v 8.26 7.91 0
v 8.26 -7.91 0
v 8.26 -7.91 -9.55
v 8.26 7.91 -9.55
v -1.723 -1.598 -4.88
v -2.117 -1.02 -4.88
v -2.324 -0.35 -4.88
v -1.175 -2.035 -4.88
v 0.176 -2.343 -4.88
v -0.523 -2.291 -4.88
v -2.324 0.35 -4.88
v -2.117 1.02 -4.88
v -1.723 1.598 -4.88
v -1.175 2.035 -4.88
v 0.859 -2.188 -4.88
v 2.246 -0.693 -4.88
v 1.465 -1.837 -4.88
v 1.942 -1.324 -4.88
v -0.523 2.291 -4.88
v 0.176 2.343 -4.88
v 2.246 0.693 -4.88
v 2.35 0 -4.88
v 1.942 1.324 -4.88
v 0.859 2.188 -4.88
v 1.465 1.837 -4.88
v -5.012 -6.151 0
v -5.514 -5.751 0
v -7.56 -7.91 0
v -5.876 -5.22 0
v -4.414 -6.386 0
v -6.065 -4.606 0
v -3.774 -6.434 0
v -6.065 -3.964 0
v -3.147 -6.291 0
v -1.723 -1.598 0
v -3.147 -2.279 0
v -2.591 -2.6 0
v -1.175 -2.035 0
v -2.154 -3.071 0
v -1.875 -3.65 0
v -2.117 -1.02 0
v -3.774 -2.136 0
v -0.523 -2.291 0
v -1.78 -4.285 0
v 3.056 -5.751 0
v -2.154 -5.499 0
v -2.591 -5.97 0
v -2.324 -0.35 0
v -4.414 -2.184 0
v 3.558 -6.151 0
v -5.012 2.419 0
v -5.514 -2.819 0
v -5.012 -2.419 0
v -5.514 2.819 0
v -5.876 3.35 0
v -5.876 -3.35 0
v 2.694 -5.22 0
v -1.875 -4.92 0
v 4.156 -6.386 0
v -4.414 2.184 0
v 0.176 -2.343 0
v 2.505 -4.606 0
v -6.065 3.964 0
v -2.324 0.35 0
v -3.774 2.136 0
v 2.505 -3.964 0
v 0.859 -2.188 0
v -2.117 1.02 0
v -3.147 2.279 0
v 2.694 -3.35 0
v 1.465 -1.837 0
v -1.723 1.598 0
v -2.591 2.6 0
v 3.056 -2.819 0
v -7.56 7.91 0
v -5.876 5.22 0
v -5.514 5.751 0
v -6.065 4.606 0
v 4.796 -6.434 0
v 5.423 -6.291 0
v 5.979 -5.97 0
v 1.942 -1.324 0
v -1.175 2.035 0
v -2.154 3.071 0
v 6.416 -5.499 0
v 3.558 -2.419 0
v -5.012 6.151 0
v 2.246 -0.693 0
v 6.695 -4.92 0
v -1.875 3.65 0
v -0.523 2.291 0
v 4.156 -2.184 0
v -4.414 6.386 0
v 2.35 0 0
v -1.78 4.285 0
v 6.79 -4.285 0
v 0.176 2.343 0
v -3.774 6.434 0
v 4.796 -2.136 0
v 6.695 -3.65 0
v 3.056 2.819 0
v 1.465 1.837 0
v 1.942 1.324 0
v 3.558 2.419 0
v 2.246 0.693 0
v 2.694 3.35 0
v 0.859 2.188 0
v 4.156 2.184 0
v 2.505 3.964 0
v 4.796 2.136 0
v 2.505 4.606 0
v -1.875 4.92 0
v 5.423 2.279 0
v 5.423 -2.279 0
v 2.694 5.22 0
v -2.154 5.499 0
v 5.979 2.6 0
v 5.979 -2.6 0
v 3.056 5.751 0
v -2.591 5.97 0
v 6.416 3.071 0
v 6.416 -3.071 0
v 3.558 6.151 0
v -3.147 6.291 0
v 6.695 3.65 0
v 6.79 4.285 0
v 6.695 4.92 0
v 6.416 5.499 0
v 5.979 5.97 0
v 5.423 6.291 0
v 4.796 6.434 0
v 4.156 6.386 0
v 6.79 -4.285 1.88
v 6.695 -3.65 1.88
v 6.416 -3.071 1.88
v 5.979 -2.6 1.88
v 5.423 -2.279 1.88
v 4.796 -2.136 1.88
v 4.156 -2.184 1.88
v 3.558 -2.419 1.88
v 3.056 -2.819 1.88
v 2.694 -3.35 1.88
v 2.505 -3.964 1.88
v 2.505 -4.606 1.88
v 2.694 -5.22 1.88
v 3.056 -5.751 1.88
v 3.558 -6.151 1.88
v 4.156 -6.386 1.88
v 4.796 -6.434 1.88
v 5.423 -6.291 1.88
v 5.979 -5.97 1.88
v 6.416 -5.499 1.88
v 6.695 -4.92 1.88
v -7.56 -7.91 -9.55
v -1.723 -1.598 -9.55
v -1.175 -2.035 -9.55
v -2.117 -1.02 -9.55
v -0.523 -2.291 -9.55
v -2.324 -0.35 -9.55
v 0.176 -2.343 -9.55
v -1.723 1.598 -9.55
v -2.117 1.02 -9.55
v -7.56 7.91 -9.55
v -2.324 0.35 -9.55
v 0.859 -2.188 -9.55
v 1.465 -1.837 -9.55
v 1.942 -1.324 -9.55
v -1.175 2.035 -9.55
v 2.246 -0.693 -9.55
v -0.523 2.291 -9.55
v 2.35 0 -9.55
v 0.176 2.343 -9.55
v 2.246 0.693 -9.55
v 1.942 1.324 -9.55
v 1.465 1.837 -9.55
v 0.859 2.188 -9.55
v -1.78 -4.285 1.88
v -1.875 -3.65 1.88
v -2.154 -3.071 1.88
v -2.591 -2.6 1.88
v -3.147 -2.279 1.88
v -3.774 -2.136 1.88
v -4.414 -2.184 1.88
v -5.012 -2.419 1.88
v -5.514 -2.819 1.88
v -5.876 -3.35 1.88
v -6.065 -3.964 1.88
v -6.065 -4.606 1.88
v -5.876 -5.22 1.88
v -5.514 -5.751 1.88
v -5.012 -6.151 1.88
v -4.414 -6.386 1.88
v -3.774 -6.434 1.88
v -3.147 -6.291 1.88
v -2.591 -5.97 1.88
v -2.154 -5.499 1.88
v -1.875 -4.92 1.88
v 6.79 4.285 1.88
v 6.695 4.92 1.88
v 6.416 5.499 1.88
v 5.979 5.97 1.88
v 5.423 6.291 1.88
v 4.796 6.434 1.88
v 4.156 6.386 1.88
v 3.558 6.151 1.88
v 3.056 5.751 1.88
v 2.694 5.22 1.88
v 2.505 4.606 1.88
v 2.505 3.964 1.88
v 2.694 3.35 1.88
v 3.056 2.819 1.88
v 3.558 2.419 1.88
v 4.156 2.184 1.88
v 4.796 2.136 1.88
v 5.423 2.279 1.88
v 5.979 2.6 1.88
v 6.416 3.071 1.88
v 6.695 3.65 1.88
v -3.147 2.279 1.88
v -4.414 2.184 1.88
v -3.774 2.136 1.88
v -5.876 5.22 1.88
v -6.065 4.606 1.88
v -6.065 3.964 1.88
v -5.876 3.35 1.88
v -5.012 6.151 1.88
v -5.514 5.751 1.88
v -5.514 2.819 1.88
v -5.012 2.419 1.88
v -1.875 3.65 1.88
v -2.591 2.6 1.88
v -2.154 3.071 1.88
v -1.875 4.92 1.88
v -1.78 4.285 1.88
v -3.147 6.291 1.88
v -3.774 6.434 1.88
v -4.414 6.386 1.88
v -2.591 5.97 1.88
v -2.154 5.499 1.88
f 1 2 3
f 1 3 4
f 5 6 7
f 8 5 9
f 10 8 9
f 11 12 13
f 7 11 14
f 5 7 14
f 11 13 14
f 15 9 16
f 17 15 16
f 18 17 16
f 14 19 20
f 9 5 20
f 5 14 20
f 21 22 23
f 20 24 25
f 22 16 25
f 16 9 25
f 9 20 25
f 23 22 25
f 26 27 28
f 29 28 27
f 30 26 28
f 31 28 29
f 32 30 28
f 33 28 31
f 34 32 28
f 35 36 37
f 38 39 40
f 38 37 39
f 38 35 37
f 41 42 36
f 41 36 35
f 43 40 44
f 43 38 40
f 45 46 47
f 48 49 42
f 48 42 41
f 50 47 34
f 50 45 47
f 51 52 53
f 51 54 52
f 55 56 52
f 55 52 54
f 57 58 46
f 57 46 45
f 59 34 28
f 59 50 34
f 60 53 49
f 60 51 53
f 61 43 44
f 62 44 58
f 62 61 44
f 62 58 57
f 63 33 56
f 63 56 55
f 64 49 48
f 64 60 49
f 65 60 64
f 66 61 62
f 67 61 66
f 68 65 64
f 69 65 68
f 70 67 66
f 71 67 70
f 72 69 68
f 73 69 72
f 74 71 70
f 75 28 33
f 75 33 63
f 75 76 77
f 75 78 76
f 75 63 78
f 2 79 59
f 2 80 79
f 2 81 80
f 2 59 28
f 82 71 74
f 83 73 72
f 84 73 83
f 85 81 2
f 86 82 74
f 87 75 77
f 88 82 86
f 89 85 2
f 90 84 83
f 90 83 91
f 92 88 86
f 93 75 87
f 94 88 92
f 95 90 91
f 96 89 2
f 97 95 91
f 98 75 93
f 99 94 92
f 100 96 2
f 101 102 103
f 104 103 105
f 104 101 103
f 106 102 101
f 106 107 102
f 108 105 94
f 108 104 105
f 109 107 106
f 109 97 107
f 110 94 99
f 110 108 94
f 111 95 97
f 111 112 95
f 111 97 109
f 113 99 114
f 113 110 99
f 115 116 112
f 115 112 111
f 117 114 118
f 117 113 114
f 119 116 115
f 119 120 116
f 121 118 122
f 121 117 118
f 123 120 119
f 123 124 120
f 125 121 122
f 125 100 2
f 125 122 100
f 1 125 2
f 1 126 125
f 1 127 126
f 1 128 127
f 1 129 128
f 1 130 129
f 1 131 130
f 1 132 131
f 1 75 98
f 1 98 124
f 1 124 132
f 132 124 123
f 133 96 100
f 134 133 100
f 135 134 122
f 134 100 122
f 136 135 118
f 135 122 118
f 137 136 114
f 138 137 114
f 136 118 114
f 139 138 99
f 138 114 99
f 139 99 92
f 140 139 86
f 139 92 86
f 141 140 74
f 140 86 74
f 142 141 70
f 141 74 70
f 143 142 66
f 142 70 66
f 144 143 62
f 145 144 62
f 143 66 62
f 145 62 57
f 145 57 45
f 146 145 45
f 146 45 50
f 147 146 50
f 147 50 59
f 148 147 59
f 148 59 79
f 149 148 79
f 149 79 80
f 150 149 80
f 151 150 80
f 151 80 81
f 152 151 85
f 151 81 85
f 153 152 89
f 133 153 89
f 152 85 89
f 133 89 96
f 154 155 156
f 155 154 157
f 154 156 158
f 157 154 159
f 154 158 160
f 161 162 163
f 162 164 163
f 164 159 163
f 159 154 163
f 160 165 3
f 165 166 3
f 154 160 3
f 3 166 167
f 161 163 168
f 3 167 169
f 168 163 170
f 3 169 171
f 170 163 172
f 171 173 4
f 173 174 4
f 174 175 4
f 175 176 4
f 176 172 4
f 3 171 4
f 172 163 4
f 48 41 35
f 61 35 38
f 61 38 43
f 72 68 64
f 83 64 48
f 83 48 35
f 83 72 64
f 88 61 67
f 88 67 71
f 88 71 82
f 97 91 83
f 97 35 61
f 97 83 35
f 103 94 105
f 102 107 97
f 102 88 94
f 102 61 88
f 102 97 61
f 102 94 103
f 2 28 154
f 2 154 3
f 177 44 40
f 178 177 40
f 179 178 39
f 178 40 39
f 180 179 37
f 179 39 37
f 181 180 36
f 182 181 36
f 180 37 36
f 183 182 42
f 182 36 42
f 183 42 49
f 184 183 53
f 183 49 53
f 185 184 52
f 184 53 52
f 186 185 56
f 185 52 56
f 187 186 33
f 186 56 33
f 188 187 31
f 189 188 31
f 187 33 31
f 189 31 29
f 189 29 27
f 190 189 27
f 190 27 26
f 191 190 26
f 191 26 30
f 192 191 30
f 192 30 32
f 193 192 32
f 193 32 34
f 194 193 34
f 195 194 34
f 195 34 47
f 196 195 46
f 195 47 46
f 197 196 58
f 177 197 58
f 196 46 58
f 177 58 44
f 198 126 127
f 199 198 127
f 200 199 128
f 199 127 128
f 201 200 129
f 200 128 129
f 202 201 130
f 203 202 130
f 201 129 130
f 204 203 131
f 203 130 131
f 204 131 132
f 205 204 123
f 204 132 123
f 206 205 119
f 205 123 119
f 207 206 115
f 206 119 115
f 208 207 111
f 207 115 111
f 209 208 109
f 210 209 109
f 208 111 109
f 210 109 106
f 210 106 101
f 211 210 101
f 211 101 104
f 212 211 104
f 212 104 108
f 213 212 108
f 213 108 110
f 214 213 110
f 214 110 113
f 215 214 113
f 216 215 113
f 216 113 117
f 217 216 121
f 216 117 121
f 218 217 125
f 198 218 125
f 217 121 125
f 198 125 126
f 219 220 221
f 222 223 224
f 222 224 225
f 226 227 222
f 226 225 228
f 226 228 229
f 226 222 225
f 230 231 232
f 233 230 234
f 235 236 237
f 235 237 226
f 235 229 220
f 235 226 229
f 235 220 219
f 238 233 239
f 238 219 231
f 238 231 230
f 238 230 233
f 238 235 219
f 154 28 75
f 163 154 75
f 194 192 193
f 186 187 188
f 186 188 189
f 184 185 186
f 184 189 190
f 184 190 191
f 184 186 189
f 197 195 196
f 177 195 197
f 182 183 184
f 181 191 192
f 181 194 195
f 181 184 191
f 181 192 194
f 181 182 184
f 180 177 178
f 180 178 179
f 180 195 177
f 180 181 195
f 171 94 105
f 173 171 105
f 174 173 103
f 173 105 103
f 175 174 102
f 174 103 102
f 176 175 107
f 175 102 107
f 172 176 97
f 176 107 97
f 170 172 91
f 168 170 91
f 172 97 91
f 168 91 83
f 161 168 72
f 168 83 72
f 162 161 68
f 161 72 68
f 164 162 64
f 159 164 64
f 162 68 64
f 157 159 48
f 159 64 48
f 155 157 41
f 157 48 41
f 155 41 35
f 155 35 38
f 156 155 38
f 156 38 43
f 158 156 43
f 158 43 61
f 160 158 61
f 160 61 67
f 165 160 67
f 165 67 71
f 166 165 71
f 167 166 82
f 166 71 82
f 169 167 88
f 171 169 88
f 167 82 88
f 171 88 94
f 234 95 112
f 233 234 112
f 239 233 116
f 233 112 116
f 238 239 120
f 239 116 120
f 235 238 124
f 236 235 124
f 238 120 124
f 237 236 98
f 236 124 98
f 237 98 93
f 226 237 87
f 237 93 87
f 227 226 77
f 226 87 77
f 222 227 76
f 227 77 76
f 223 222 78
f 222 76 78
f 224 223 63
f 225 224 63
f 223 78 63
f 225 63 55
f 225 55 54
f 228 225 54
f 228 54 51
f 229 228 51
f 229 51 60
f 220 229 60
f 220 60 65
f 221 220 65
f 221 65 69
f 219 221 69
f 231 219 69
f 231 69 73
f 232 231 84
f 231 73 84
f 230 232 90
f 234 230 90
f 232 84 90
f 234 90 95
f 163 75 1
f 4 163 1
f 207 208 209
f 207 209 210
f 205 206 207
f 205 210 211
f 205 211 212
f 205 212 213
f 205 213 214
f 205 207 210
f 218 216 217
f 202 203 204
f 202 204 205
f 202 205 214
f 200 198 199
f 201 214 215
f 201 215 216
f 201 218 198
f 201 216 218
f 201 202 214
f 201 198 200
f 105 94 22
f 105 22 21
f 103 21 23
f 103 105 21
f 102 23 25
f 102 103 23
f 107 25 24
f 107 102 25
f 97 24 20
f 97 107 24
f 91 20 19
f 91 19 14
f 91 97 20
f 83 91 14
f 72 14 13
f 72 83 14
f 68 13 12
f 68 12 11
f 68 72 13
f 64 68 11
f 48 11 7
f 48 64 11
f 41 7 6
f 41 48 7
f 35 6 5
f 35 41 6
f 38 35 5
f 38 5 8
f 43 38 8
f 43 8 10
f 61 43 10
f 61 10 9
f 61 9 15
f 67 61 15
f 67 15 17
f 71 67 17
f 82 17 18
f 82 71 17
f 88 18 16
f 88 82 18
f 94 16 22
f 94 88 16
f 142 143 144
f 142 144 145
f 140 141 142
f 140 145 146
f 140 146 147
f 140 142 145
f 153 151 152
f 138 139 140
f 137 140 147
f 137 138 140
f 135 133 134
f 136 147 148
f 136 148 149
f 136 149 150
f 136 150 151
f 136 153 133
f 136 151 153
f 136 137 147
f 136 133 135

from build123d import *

# Parameters (mm, degrees)
F0_W     = 15.82
F0_H     = 15.82
F0_R     = 2.155
F0_R_2   = 2.35
F1_DEPTH = 9.55
F2_DEPTH = 1.88
F3_DEPTH = 4.88


with BuildPart() as f1:
    # F0 (on Top) → F1 (new body)
    with BuildSketch(Plane.XY):
        with Locations((0.3504429367, 0)):
            Rectangle(F0_W, F0_H)
        with Locations((-3.9345570633, -4.285)):
            Circle(F0_R, mode=Mode.SUBTRACT)
        Circle(F0_R_2, mode=Mode.SUBTRACT)
        with Locations((4.6354429367, -4.285)):
            Circle(F0_R, mode=Mode.SUBTRACT)
        with Locations((-3.9345570633, 4.285)):
            Circle(F0_R, mode=Mode.SUBTRACT)
        with Locations((4.6354429367, 4.285)):
            Circle(F0_R, mode=Mode.SUBTRACT)
        with Locations((-3.9345570633, -4.285)):
            Circle(F0_R)
        with Locations((-3.9345570633, 4.285)):
            Circle(F0_R)
        with Locations((4.6354429367, 4.285)):
            Circle(F0_R)
        with Locations((4.6354429367, -4.285)):
            Circle(F0_R)
    extrude(amount=-F1_DEPTH)

    # F0 (on Top) → F2 (join)
    with BuildSketch(Plane.XY):
        with Locations((-3.9345570633, 4.285)):
            Circle(F0_R)
        with Locations((-3.9345570633, -4.285)):
            Circle(F0_R)
        with Locations((4.6354429367, 4.285)):
            Circle(F0_R)
        with Locations((4.6354429367, -4.285)):
            Circle(F0_R)
    extrude(amount=F2_DEPTH)


with BuildPart() as f3:
    # F0 (on Top) → F3 (new body)
    with BuildSketch(Plane.XY):
        Circle(F0_R_2)
    extrude(amount=-F3_DEPTH)


solid = Compound([f1.part, f3.part])
